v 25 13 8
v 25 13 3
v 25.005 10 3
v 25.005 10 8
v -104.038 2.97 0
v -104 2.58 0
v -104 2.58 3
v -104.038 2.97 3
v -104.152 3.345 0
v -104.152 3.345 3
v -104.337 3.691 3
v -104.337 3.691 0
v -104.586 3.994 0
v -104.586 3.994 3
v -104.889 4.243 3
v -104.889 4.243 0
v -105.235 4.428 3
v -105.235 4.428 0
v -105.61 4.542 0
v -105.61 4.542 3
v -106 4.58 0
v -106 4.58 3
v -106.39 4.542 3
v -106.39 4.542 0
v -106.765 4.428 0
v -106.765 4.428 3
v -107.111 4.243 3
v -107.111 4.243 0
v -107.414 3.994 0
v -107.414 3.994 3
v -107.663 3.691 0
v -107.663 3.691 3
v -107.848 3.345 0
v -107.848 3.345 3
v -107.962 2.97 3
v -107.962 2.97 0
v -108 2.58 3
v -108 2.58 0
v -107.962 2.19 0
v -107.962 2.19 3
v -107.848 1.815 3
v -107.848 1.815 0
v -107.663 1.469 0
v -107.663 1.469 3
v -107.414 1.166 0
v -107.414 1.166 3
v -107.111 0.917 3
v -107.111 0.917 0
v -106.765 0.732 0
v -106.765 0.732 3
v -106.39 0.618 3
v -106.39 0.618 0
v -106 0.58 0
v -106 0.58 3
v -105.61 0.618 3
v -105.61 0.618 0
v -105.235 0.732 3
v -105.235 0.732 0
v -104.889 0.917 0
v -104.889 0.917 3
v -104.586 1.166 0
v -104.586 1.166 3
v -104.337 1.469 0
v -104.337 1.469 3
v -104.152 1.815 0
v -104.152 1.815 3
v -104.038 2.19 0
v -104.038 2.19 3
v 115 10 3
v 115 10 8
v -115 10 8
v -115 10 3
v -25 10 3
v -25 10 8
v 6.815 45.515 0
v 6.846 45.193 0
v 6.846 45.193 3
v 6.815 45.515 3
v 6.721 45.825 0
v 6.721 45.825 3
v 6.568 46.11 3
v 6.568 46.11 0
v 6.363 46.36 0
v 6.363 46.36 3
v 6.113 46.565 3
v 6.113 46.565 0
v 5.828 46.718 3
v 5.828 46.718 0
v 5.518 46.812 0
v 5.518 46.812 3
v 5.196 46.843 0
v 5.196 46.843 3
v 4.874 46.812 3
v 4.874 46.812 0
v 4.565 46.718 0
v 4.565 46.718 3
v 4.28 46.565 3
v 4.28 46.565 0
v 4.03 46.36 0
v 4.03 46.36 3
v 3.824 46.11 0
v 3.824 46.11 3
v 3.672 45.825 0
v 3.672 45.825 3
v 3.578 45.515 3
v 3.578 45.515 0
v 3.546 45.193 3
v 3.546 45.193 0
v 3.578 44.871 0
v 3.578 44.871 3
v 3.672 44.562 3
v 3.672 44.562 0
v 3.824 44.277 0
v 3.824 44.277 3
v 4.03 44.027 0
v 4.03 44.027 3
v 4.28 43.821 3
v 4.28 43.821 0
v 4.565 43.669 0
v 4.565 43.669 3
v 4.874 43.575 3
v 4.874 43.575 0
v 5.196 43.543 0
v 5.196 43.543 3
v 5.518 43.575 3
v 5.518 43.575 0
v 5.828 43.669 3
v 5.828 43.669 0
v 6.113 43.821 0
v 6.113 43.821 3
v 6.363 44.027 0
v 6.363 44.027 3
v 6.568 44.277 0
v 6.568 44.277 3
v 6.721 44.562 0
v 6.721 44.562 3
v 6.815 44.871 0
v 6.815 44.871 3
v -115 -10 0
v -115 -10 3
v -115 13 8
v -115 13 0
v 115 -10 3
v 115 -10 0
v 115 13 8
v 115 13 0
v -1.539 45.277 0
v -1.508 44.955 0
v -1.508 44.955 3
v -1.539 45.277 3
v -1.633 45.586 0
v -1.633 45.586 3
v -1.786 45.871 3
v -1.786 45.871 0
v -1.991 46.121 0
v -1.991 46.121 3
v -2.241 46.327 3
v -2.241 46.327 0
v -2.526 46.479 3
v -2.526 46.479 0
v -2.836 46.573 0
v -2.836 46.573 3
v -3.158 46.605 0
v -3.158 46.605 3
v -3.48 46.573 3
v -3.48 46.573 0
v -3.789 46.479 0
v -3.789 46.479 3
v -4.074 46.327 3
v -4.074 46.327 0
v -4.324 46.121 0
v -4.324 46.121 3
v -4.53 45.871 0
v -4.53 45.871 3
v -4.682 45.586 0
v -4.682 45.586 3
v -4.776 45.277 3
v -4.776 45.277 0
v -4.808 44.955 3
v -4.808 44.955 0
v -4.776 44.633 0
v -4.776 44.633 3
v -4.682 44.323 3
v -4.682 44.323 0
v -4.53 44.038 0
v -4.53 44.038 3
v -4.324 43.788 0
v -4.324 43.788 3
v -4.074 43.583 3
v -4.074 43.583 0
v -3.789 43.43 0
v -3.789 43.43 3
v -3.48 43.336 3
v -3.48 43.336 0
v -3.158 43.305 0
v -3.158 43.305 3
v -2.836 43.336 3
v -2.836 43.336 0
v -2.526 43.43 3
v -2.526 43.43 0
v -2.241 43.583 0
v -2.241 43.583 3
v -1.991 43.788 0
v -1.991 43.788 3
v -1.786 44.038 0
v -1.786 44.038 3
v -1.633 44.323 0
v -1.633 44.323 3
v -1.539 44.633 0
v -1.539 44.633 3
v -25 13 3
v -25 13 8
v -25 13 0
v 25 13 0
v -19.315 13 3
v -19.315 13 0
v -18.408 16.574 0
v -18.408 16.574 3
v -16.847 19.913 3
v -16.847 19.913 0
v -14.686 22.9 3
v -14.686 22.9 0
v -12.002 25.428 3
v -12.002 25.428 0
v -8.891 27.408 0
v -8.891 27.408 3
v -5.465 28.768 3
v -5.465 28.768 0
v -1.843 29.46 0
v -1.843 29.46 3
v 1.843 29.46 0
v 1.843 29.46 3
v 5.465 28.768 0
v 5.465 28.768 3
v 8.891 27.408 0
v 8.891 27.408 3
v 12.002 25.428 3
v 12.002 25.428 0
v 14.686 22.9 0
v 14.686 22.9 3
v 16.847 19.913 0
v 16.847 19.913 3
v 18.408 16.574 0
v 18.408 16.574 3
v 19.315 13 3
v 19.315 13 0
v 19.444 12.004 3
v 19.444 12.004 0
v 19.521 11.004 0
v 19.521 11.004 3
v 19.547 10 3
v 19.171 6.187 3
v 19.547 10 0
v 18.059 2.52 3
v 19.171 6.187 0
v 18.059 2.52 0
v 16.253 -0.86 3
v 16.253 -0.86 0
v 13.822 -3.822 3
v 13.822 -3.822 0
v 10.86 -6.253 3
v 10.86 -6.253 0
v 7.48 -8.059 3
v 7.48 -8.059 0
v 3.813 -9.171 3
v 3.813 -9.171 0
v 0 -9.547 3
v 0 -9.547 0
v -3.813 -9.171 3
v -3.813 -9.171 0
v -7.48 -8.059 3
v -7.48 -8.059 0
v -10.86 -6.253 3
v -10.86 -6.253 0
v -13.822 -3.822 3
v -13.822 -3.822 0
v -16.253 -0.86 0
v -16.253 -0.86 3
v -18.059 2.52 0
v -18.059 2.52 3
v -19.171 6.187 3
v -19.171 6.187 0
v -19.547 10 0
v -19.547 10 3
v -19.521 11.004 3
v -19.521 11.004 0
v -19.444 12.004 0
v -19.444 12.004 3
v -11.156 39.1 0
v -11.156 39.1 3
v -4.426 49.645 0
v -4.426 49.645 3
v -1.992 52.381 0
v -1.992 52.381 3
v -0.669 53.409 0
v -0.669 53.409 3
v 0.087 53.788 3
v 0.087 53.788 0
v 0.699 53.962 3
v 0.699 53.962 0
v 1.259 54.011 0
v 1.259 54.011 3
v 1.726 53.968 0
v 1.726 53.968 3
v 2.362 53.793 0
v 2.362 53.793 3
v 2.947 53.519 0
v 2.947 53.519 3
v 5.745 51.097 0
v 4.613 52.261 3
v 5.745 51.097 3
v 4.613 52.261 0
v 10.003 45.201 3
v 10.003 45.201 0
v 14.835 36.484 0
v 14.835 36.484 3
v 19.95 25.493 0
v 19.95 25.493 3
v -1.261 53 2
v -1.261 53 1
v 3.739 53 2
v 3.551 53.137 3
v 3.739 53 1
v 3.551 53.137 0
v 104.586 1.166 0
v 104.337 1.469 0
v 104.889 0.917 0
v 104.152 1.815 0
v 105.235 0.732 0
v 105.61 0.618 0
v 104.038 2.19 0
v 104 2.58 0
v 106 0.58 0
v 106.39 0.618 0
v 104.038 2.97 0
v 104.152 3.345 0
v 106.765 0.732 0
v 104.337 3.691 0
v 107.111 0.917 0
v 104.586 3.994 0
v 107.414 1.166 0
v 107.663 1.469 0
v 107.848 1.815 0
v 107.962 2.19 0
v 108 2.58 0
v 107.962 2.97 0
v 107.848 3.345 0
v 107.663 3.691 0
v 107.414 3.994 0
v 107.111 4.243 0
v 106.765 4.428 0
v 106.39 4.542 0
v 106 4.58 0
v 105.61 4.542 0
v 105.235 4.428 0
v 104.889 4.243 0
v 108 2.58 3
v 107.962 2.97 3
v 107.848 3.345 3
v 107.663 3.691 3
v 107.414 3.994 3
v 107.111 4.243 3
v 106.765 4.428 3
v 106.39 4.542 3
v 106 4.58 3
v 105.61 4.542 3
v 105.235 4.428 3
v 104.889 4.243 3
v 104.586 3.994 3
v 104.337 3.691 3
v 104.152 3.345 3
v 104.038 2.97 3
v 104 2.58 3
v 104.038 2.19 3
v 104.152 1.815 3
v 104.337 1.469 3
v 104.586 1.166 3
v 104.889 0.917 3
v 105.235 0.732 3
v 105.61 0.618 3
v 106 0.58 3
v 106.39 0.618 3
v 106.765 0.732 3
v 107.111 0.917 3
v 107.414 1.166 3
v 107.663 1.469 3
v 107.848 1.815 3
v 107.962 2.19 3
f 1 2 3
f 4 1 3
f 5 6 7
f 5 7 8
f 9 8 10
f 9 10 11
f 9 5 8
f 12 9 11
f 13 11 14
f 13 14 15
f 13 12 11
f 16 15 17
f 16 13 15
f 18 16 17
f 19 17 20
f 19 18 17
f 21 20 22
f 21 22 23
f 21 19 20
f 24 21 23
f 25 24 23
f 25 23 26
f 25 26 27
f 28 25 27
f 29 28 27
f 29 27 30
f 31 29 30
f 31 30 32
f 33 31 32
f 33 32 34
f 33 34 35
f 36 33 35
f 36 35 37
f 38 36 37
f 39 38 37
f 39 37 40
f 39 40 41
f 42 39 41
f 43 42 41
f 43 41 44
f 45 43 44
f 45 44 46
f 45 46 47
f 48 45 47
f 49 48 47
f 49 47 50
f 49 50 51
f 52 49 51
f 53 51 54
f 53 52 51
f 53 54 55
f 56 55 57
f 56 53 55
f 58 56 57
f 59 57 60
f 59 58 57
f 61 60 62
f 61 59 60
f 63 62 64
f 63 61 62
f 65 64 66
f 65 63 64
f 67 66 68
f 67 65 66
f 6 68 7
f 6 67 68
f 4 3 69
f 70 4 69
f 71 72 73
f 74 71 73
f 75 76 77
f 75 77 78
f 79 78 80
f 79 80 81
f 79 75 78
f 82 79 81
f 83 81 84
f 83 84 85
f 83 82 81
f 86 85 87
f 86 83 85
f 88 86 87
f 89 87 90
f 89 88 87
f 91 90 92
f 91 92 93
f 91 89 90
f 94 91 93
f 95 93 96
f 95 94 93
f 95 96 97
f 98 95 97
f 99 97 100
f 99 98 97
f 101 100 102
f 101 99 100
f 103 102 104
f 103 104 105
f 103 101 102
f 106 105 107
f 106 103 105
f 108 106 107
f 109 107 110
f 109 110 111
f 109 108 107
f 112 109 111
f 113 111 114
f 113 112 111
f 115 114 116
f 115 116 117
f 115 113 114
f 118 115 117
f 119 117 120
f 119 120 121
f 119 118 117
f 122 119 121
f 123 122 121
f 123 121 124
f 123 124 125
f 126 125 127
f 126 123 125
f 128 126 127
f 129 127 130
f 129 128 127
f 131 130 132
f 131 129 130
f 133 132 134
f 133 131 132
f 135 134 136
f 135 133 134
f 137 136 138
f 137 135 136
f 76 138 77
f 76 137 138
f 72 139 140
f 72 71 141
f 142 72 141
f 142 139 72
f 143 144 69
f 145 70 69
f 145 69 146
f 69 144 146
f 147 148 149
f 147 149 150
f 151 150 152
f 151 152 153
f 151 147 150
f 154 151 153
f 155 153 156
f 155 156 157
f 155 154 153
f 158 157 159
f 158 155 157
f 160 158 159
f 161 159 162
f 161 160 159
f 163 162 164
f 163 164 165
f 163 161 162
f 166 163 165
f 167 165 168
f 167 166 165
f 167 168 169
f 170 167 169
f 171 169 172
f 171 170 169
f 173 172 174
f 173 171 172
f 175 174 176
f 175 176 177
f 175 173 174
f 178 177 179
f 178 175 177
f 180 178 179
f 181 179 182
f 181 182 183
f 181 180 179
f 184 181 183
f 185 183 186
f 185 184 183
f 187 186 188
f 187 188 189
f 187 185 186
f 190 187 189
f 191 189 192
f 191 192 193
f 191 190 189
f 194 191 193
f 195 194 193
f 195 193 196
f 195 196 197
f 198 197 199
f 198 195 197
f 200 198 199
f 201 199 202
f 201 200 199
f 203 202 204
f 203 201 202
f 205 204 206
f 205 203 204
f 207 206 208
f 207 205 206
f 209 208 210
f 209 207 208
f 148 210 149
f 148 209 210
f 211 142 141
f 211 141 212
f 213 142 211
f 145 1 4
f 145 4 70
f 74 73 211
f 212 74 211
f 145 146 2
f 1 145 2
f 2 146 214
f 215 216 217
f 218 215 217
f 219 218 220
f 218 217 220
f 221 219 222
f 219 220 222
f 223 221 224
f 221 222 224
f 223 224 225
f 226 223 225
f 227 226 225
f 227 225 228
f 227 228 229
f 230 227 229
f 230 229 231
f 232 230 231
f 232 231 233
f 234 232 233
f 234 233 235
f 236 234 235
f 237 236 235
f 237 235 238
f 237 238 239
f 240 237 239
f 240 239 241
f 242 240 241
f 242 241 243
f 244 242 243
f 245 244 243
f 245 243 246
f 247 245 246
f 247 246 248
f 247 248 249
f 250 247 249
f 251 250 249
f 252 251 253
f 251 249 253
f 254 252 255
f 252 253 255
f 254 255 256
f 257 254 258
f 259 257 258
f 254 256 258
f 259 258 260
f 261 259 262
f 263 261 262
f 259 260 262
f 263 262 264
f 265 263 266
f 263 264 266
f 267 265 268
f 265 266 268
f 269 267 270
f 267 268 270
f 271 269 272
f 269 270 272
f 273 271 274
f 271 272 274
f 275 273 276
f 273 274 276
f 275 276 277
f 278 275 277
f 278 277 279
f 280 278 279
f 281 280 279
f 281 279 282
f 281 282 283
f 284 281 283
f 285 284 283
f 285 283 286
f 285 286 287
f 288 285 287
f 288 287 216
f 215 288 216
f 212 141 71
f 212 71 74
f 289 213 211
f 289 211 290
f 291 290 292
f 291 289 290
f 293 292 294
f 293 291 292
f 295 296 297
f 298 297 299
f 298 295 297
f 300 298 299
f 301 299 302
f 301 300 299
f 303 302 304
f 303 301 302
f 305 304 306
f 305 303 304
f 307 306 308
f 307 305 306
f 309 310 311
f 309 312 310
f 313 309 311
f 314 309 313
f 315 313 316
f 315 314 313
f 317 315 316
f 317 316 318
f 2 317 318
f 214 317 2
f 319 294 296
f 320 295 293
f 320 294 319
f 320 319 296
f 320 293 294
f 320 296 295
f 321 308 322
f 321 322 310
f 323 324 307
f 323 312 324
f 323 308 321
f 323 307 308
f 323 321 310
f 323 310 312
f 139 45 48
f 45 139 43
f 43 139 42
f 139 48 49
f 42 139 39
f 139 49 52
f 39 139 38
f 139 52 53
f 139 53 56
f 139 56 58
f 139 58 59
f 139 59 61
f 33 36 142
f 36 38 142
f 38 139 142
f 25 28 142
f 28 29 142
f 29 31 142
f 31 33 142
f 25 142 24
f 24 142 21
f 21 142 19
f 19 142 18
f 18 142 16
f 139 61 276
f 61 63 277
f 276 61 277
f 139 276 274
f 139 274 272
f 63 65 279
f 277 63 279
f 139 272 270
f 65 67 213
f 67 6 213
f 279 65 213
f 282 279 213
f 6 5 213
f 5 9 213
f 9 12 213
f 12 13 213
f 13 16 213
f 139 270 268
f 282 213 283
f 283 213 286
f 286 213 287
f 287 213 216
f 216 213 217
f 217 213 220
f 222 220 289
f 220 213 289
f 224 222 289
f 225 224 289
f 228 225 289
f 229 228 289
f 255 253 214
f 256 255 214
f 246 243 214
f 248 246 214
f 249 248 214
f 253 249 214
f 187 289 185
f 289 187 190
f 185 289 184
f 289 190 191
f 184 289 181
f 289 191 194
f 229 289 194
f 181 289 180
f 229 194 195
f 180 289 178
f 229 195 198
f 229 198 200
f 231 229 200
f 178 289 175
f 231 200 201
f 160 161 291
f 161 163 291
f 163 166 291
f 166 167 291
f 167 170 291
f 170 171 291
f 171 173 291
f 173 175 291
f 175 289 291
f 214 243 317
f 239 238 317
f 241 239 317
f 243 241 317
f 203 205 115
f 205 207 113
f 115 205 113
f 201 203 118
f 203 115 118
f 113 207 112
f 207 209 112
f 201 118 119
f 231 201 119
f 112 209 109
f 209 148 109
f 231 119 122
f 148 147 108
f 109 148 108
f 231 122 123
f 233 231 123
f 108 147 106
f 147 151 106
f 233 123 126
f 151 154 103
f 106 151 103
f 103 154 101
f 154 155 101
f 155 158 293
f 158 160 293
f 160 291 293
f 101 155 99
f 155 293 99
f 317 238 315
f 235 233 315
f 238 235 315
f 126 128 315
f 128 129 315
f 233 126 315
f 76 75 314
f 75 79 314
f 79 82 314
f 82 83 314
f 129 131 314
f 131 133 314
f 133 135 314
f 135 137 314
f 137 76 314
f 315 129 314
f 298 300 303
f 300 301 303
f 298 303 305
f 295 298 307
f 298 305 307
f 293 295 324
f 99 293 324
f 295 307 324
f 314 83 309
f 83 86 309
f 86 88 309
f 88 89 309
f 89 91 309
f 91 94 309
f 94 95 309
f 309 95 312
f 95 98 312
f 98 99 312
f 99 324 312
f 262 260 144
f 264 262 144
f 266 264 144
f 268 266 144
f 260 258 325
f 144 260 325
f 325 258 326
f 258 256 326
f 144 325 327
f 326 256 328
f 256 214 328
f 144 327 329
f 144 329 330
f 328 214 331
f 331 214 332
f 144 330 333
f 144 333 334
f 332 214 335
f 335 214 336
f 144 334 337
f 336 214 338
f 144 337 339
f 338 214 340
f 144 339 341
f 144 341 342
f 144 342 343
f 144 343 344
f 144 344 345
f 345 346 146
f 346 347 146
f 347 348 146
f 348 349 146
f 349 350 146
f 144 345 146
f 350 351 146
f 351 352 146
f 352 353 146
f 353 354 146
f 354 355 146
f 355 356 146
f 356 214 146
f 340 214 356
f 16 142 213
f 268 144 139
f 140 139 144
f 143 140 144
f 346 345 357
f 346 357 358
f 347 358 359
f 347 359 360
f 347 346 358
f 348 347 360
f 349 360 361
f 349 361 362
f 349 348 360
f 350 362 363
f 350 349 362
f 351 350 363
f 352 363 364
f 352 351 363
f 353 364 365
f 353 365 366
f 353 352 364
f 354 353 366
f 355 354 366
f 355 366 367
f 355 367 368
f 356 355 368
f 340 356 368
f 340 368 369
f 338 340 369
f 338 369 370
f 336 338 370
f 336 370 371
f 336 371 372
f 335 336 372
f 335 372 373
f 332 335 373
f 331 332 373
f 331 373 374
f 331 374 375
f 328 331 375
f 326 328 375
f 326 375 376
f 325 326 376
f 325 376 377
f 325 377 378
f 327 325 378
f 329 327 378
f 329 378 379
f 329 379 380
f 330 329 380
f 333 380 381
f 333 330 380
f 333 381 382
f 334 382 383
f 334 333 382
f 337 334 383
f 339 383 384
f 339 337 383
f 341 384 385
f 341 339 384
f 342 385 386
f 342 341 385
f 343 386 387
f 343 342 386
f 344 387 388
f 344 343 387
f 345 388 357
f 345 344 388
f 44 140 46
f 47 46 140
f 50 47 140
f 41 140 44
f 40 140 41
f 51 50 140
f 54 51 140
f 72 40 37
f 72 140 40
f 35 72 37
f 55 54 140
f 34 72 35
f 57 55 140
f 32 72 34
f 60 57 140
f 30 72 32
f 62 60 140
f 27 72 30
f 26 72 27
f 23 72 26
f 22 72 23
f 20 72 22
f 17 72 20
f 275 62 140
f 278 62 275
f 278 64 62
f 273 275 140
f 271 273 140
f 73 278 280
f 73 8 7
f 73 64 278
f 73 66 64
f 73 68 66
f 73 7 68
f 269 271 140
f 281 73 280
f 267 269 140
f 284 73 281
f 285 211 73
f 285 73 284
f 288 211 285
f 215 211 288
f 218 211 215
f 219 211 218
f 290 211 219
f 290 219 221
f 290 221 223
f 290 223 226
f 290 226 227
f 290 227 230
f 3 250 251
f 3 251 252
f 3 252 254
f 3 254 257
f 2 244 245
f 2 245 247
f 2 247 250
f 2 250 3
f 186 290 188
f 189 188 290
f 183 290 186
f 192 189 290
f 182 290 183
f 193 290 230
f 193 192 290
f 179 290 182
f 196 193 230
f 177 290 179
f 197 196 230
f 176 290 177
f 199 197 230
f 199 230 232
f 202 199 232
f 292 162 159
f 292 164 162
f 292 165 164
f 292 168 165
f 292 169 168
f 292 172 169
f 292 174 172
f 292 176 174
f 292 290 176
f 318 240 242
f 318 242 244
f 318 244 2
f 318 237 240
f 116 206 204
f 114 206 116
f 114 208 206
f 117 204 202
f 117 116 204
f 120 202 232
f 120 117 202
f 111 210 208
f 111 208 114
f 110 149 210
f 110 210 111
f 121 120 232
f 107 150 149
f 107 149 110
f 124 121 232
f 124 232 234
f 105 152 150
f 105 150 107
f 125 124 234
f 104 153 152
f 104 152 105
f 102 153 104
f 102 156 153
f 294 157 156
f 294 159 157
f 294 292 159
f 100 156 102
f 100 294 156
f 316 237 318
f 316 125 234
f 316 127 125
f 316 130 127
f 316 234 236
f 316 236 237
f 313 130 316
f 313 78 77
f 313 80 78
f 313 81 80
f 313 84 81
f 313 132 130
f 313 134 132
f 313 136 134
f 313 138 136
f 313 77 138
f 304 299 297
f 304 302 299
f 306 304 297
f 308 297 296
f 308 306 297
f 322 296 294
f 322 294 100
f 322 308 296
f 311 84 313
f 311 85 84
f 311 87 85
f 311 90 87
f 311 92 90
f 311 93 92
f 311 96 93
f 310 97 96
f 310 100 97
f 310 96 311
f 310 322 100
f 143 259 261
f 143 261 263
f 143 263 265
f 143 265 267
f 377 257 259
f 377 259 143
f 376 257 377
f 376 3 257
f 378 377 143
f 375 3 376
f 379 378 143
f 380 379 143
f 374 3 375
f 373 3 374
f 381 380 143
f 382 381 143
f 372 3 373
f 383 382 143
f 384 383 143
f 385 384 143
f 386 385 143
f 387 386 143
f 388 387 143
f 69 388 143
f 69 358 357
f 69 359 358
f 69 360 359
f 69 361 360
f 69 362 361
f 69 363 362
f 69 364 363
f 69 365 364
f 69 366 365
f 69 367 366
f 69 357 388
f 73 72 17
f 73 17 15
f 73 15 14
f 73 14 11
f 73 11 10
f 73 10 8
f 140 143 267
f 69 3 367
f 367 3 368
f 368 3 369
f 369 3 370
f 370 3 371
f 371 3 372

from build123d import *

# Parameters (mm, degrees)
F0_R     = 2
F1_DEPTH = 2
F0_W     = 90
F0_H     = 3
F2_DEPTH = 8
F0_R_2   = 1.65
F3_DEPTH = 3
F4_DEPTH = 8


with BuildPart() as f1:
    # F0 (on Top) → F1 (new body)
    with BuildSketch(Plane.XY):
        with BuildLine():
            Line((-25, 10), (-115, 10))
            Line((-115, 10), (-115, -10))
            Line((-115, -10), (115, -10))
            Line((115, -10), (115, 10))
            Line((115, 10), (25.00533, 10))
            Line((25.00533, 10), (19.5469227509, 10))
            ThreePointArc((19.5469227509, 10), (0, -9.5469227509), (-19.5469227509, 10))
            Line((-19.5469227509, 10), (-25, 10))
        make_face()
        with Locations((-106, 2.58)):
            Circle(F0_R, mode=Mode.SUBTRACT)
        with Locations((106, 2.58)):
            Circle(F0_R, mode=Mode.SUBTRACT)
    extrude(amount=F1_DEPTH)

    # F0 (on Top) → F2 (join)
    with BuildSketch(Plane.XY):
        with Locations((-70, 11.5)):
            Rectangle(F0_W, F0_H)
    extrude(amount=F2_DEPTH)

    # F0 (on Top) → F3 (join)
    with BuildSketch(Plane.XY):
        with Locations((-70, 11.5)):
            Rectangle(F0_W, F0_H)
        with BuildLine():
            Line((-25, 10), (-115, 10))
            Line((-115, 10), (-115, -10))
            Line((-115, -10), (115, -10))
            Line((115, -10), (115, 10))
            Line((115, 10), (25.00533, 10))
            Line((25.00533, 10), (19.5469227509, 10))
            ThreePointArc((19.5469227509, 10), (0, -9.5469227509), (-19.5469227509, 10))
            Line((-19.5469227509, 10), (-25, 10))
        make_face()
        with Locations((-106, 2.58)):
            Circle(F0_R, mode=Mode.SUBTRACT)
        with Locations((106, 2.58)):
            Circle(F0_R, mode=Mode.SUBTRACT)
        with BuildLine():
            Line((-25, 13), (-25, 10))
            Line((-25, 10), (-19.5469227509, 10))
            ThreePointArc((-19.5469227509, 10), (-19.4889399629, 11.5044627456), (-19.3153355919, 13))
            Line((-19.3153355919, 13), (-25, 13))
        make_face()
        with BuildLine():
            add(Edge.make_bspline(
                [(-25, 13), (-15.2288932053, 31.7892976505), (-3.8915806674, 54.4419920661), (6.3176813113, 54.2545952389), (17.3850999523, 33.1166154585), (25, 13)],
                knots=[0, 0, 0, 0, 0.4320168298, 0.5736597665, 1, 1, 1, 1], degree=3))
            Line((-25, 13), (-19.3153355919, 13))
            ThreePointArc((-19.3153355919, 13), (0, 29.5469227509), (19.3153355919, 13))
            Line((19.3153355919, 13), (25, 13))
        make_face()
        with Locations((-3.1577504706, 44.9546910822)):
            Circle(F0_R_2, mode=Mode.SUBTRACT)
        with Locations((5.1963478327, 45.1933816075)):
            Circle(F0_R_2, mode=Mode.SUBTRACT)
        with BuildLine():
            ThreePointArc((19.3153355919, 13), (19.4889399629, 11.5044627456), (19.5469227509, 10))
            Line((19.5469227509, 10), (25.00533, 10))
            Line((25.00533, 10), (25, 13))
            Line((25, 13), (19.3153355919, 13))
        make_face()
        Polygon((115, 13), (25, 13), (25.00533, 10), (115, 10), align=None)
    extrude(amount=F3_DEPTH)

    # F0 (on Top) → F4 (join)
    with BuildSketch(Plane.XY):
        Polygon((115, 13), (25, 13), (25.00533, 10), (115, 10), align=None)
    extrude(amount=F4_DEPTH)


solid = f1.part
